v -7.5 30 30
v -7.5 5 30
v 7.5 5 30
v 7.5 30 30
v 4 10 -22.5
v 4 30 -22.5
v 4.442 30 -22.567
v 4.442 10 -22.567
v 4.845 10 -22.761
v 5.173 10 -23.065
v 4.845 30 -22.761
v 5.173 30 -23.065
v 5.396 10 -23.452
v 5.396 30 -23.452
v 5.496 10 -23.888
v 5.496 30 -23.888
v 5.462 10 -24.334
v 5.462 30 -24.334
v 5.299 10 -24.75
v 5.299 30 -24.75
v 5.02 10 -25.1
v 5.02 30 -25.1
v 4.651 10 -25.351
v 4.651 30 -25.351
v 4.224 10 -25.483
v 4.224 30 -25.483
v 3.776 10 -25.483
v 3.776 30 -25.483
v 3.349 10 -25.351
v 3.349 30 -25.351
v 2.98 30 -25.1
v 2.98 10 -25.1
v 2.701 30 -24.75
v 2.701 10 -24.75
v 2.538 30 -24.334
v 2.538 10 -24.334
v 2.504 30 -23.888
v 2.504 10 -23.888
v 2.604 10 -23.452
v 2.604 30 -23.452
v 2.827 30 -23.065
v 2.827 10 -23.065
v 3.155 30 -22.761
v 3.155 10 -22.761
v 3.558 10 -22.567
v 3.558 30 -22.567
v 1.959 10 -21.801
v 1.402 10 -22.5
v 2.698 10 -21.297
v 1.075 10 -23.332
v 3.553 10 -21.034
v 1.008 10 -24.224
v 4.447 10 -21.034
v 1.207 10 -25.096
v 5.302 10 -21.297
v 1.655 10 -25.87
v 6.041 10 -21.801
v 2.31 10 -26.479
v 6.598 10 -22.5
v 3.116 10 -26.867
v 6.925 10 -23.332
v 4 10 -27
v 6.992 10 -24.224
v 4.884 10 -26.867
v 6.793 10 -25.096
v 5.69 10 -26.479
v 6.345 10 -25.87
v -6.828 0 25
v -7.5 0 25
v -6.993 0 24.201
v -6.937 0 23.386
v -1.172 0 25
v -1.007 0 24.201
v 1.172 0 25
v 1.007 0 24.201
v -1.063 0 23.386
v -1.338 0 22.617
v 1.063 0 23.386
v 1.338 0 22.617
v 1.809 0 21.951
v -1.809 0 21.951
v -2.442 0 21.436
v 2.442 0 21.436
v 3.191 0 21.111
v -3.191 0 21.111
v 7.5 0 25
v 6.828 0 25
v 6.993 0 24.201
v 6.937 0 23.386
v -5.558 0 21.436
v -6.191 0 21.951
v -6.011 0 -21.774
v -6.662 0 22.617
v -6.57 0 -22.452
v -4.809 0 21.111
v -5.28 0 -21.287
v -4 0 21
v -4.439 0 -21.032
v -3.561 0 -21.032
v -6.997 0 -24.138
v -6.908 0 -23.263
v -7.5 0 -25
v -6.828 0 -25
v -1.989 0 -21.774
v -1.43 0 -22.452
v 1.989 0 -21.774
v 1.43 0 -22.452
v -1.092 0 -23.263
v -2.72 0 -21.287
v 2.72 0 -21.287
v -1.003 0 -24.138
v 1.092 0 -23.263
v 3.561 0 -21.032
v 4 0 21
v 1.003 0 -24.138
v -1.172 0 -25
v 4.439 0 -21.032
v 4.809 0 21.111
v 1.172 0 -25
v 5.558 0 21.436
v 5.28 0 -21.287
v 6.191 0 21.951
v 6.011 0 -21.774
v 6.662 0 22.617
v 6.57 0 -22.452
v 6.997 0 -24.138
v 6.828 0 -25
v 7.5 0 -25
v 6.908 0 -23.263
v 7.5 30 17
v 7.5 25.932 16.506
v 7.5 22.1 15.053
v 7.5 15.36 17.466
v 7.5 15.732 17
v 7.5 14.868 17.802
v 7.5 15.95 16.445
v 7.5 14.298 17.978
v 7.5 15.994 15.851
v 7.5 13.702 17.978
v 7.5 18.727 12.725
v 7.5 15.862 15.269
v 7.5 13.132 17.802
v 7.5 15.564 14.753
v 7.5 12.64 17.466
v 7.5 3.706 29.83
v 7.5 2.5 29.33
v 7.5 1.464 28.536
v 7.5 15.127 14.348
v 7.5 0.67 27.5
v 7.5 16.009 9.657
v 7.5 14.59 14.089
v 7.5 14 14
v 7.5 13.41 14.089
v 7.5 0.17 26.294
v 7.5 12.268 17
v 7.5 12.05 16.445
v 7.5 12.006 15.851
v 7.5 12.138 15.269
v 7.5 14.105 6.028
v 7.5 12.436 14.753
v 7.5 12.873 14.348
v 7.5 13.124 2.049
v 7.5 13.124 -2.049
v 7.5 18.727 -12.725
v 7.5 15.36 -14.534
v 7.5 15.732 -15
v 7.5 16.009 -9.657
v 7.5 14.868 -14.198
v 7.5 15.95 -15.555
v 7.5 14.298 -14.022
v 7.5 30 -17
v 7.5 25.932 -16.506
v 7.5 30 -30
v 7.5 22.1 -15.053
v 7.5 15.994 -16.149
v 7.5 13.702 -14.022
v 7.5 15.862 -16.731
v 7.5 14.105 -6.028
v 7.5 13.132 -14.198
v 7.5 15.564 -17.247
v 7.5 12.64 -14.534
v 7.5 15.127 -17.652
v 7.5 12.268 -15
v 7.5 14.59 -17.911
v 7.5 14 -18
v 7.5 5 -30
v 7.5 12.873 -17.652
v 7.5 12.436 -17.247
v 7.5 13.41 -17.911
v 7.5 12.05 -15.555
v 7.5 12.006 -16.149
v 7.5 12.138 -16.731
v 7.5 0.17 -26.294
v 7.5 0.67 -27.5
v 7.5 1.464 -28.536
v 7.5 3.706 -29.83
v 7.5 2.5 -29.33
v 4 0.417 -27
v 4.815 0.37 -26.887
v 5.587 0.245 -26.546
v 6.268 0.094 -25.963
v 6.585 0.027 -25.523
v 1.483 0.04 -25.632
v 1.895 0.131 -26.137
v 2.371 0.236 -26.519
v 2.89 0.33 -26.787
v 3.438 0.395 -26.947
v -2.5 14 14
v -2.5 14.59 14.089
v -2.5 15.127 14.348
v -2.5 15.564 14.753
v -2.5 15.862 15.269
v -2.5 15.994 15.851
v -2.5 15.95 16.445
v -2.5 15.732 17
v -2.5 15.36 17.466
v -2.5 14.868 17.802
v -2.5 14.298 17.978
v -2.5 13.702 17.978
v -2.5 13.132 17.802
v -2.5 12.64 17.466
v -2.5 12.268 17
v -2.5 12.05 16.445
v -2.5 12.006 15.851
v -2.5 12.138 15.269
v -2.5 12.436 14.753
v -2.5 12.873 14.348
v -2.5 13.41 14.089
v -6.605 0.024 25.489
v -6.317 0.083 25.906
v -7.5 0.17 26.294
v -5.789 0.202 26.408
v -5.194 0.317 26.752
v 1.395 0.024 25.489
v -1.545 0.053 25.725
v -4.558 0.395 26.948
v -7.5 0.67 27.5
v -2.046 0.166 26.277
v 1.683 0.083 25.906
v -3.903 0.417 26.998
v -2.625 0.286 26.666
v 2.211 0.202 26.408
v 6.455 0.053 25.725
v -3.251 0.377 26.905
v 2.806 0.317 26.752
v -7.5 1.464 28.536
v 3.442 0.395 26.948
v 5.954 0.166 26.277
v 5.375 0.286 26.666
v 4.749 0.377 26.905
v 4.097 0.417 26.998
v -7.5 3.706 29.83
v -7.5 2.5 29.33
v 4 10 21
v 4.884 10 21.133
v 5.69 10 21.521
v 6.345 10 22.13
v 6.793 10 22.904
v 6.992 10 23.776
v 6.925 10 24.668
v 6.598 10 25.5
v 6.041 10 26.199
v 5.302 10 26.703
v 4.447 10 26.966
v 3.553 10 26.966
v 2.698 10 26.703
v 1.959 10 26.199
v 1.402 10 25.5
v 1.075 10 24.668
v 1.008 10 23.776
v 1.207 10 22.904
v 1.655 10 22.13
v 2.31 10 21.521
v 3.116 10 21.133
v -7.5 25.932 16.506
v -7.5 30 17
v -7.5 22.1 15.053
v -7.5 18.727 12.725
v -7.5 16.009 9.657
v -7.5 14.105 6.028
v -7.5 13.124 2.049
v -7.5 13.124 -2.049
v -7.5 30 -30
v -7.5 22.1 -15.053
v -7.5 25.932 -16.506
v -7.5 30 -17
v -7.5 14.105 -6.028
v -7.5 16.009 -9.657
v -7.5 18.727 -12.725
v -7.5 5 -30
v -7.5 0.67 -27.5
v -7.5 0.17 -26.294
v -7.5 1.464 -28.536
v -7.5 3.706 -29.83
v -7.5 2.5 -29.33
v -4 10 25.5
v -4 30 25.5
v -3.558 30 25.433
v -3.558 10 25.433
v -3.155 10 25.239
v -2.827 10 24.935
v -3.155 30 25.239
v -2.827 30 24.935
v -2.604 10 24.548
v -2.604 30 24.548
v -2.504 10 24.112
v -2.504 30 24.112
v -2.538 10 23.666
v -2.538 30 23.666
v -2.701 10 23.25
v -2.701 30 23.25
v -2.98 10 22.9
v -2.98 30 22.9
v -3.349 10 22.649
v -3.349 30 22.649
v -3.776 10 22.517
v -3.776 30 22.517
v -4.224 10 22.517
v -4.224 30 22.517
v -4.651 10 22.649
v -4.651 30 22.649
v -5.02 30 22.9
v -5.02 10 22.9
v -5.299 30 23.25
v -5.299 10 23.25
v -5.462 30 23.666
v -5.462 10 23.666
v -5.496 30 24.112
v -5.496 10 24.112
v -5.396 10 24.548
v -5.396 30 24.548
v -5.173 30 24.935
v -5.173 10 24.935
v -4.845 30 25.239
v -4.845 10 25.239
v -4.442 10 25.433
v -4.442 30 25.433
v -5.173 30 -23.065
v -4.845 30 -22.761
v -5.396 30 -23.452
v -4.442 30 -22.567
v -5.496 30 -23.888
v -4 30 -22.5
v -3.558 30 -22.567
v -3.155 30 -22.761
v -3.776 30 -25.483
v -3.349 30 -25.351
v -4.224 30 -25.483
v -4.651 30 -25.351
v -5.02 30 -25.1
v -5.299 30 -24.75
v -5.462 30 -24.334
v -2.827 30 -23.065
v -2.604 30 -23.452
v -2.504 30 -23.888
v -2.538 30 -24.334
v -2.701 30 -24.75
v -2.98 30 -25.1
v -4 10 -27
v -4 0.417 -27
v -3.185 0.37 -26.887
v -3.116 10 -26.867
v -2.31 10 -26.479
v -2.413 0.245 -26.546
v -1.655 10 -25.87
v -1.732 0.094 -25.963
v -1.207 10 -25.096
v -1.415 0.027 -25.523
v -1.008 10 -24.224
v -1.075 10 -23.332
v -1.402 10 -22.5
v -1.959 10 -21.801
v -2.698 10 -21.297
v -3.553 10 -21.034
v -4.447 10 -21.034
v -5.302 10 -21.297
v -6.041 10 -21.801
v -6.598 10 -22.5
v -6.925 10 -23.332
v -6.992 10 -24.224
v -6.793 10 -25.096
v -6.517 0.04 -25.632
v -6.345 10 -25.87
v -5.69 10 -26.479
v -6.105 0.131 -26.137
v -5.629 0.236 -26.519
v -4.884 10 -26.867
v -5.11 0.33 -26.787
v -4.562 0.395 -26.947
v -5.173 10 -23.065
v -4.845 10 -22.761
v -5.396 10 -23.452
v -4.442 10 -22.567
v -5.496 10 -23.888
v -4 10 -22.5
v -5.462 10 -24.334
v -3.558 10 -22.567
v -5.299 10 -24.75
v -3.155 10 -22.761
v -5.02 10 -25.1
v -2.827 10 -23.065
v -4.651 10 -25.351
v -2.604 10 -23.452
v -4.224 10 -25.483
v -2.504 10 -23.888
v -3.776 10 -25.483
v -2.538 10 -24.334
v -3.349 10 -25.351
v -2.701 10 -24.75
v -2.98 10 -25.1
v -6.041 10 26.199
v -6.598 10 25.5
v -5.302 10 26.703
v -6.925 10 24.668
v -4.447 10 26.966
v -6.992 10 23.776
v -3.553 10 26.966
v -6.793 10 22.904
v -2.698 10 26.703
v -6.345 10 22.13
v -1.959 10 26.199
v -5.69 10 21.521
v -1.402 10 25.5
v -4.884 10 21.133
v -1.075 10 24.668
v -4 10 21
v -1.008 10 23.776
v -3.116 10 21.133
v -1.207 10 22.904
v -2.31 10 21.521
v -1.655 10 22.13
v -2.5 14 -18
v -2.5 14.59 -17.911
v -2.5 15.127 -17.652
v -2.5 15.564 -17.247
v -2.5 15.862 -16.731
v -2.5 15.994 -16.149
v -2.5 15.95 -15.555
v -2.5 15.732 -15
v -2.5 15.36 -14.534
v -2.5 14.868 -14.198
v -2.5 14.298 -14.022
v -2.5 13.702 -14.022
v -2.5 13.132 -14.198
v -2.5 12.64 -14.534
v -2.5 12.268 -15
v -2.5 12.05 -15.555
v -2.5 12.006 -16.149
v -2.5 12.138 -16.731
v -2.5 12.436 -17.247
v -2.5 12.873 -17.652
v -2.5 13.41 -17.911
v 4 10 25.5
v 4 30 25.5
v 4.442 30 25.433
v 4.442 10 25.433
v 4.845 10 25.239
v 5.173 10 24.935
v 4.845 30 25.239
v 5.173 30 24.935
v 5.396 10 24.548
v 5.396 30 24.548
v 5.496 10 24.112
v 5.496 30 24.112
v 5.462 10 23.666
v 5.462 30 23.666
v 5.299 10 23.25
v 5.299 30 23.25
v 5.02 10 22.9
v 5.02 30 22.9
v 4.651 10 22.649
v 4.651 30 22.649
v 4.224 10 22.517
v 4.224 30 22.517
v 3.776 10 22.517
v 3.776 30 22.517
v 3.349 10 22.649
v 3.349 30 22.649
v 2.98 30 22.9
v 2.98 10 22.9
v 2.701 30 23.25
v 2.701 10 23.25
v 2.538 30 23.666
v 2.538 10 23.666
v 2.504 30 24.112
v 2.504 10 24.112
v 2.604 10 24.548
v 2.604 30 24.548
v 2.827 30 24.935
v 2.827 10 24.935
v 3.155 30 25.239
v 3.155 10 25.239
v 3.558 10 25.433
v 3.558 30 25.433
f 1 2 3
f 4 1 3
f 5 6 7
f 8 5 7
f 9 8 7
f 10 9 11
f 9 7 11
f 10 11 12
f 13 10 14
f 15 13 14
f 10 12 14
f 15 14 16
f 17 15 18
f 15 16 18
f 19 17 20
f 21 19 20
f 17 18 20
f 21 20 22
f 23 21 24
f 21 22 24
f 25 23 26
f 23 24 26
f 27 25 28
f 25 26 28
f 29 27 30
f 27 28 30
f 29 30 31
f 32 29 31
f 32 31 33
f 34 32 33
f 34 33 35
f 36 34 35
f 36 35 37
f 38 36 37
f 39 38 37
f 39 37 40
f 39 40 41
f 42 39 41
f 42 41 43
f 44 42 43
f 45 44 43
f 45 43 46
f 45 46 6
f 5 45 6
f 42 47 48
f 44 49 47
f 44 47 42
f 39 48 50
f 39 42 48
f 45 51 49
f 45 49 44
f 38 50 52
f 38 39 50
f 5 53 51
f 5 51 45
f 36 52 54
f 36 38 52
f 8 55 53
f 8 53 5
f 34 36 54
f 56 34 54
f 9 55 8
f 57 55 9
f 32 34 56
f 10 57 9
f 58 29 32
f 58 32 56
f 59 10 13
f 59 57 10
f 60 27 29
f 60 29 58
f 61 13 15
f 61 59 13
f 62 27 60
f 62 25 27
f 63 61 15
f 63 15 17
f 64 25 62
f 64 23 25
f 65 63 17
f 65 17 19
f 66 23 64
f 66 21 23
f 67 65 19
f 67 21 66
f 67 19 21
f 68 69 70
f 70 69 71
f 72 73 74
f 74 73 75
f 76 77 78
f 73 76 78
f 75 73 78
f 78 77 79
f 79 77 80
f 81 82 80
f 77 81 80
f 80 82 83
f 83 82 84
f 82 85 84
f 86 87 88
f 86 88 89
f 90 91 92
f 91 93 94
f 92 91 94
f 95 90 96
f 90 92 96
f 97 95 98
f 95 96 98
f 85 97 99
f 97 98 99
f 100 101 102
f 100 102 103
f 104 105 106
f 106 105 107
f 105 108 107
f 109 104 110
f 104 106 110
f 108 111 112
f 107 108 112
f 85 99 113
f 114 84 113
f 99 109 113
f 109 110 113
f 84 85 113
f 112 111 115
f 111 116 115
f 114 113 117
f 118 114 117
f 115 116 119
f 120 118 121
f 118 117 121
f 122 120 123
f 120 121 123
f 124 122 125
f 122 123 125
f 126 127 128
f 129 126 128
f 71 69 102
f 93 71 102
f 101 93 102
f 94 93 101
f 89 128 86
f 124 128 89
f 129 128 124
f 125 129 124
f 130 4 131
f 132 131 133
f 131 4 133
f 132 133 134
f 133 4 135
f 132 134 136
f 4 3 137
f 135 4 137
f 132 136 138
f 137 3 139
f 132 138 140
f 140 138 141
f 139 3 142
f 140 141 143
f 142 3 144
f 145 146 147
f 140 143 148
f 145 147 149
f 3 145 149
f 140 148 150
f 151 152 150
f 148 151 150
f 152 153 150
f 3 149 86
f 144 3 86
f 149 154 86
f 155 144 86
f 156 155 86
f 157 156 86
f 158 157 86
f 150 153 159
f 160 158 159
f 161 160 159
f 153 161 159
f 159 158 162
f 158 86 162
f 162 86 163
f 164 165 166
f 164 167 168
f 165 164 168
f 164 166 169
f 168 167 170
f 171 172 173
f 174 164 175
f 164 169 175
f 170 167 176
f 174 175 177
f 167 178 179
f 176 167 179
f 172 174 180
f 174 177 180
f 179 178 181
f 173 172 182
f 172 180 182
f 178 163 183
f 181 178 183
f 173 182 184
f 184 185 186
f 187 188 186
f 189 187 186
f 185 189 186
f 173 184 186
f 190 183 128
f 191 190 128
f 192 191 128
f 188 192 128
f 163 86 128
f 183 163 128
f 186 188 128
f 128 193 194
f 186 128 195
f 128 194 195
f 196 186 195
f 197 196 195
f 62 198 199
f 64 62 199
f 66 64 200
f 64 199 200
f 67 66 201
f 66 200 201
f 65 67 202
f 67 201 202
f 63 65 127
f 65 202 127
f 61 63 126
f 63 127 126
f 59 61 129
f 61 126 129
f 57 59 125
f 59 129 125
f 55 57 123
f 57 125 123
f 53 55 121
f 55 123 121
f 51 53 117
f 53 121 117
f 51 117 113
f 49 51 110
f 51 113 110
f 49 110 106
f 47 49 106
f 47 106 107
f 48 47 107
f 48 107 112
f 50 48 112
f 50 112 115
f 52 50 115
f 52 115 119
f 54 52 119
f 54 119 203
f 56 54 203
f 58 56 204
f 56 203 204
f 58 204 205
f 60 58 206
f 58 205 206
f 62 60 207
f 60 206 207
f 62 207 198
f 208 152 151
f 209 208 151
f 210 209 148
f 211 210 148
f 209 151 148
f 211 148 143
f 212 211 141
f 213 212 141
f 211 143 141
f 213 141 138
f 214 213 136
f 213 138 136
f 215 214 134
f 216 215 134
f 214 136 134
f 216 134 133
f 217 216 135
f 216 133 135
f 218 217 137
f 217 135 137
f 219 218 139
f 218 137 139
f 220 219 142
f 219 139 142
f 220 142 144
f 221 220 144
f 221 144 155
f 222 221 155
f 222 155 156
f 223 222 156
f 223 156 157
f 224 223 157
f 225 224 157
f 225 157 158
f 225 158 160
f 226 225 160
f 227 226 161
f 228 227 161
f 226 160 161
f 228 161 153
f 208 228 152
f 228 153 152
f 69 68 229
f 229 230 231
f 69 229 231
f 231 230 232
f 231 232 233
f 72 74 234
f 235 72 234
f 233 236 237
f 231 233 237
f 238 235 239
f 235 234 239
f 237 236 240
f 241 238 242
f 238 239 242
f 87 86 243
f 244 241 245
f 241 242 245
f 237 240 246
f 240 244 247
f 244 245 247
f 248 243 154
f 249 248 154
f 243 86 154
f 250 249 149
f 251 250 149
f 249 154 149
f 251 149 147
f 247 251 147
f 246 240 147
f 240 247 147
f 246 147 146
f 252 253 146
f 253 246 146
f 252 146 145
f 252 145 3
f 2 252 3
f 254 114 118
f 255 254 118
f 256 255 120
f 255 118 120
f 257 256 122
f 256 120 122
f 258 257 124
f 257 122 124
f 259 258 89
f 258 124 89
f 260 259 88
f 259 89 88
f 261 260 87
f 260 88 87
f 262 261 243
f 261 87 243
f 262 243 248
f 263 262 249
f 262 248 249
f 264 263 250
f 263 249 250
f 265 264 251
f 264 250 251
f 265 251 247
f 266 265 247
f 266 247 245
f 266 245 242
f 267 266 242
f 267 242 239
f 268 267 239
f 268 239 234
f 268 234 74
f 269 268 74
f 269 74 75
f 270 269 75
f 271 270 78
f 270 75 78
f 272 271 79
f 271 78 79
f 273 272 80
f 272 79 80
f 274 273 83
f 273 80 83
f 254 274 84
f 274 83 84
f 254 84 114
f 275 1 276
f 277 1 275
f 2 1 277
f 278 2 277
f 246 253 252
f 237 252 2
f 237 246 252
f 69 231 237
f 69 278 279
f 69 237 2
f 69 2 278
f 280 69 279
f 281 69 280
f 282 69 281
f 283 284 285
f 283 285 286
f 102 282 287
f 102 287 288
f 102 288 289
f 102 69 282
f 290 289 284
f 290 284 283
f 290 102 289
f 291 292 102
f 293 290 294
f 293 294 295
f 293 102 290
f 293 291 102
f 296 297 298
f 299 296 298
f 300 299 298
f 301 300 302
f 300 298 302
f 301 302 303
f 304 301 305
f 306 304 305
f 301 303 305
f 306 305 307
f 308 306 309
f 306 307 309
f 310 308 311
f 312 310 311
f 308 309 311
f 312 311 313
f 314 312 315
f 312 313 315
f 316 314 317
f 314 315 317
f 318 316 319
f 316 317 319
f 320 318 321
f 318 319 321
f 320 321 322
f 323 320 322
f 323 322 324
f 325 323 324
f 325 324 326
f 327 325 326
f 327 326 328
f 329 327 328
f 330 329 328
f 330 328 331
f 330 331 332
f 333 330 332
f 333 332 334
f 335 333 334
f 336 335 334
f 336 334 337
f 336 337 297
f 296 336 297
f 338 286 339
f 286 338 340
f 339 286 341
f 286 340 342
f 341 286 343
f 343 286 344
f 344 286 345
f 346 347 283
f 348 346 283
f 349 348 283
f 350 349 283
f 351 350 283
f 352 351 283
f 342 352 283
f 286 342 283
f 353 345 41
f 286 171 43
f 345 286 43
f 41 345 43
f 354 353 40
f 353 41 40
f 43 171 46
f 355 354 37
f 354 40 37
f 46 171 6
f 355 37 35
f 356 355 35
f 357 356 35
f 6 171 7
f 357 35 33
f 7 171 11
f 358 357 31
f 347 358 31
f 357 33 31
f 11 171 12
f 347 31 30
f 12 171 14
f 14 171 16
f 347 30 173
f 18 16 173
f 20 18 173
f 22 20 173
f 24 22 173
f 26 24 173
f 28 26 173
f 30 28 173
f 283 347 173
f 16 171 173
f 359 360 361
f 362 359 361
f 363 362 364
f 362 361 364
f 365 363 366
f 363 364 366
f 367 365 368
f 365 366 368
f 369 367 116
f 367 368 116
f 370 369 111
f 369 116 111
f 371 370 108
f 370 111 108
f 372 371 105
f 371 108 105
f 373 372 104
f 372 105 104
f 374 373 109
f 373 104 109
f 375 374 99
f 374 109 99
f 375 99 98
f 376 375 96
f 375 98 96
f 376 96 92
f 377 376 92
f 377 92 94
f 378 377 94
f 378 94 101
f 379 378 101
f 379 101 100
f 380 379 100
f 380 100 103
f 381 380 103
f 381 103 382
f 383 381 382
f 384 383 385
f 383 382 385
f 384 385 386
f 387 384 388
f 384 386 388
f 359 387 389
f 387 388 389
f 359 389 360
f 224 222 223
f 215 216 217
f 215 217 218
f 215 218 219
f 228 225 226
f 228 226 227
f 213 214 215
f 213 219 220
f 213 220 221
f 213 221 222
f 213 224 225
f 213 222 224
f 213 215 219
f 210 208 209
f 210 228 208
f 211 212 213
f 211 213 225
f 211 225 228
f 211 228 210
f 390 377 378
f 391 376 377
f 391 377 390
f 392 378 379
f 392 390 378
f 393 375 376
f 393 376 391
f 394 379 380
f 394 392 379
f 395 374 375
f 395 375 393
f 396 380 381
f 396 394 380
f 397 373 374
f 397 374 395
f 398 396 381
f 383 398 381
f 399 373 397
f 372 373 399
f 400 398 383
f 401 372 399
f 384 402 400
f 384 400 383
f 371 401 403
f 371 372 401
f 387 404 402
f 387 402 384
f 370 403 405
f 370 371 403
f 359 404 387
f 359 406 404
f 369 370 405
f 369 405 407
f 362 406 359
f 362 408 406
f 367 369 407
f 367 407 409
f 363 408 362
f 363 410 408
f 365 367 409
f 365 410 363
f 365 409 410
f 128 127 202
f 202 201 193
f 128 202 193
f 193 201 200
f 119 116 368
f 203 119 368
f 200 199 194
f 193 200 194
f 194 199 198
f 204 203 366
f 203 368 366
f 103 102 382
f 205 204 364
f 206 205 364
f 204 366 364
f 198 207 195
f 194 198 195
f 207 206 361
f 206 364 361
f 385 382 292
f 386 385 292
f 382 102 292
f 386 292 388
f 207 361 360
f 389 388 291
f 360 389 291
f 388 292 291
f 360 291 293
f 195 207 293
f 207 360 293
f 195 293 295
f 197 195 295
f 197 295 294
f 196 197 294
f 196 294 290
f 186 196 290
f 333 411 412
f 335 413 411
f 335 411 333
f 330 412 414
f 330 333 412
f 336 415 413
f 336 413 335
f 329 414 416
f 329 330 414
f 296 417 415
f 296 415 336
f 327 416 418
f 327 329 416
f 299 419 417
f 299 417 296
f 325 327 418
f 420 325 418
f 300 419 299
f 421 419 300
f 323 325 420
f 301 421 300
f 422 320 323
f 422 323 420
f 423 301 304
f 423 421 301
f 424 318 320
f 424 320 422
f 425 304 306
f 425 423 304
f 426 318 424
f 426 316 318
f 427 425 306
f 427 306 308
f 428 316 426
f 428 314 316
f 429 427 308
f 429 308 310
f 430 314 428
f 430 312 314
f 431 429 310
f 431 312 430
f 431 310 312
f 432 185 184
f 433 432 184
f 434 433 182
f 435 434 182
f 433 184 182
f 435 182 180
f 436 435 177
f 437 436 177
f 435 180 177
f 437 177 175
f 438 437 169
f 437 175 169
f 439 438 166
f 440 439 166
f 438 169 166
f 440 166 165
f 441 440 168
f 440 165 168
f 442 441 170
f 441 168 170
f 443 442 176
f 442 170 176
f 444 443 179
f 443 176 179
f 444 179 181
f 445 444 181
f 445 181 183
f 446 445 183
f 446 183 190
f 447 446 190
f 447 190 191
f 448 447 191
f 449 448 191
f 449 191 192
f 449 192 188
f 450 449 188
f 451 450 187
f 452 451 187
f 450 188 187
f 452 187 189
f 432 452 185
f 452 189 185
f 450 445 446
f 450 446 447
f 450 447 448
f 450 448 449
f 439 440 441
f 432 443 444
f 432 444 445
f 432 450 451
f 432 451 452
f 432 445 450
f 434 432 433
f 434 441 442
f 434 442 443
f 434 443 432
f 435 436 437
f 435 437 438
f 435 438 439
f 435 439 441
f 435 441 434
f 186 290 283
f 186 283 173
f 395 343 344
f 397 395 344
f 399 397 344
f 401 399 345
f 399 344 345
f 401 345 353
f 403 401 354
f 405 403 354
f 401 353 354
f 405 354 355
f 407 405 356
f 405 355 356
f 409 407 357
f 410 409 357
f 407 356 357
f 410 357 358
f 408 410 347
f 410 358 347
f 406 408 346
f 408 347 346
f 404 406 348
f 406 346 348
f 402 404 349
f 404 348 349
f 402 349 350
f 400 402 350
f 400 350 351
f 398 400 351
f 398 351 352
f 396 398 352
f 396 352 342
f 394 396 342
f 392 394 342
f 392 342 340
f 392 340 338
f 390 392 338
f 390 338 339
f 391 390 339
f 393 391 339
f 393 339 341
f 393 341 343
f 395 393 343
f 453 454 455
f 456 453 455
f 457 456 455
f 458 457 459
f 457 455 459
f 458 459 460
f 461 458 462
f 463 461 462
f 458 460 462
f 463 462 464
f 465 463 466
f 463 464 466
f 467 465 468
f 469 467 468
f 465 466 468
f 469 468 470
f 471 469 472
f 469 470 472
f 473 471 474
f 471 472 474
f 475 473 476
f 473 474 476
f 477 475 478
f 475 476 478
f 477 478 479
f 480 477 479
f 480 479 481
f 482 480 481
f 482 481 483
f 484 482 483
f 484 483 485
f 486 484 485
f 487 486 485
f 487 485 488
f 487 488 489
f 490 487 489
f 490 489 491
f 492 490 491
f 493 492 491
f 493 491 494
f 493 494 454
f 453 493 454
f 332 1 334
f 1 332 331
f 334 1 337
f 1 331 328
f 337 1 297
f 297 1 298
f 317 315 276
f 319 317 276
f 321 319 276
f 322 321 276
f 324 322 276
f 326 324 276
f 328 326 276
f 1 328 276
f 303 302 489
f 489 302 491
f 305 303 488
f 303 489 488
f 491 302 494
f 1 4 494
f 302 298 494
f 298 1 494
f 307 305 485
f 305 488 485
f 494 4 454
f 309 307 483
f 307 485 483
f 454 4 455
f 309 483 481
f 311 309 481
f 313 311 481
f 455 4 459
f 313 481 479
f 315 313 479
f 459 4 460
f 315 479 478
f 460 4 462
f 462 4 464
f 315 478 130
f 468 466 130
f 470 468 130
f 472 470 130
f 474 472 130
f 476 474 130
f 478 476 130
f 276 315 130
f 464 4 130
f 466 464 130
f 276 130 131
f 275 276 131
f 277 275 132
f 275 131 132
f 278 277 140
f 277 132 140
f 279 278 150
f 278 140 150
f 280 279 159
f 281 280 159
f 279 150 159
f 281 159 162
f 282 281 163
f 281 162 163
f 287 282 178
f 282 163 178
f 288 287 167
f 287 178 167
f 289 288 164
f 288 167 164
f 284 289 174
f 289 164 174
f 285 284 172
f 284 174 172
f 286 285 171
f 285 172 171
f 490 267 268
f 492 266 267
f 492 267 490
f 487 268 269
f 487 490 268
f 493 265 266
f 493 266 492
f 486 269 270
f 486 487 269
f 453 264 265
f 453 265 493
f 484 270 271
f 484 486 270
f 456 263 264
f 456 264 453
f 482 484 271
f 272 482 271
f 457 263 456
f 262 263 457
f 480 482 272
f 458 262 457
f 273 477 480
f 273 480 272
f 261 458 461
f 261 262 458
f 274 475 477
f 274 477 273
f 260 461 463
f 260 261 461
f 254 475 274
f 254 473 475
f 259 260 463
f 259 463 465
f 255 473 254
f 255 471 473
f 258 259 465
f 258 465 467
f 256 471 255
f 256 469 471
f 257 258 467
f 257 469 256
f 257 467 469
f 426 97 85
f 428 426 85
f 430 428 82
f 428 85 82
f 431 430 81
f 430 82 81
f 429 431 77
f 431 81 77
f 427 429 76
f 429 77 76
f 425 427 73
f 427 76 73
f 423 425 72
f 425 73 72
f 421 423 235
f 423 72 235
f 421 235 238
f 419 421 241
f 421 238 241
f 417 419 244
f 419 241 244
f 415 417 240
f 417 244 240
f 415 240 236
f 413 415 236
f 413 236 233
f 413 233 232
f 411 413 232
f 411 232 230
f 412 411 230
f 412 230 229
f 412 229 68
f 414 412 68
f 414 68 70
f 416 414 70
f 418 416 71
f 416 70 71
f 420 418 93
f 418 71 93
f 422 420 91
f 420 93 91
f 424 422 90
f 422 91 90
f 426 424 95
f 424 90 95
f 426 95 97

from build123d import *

# Parameters (mm, degrees)
SKETCH1_W           = 15
SKETCH1_H           = 60
BOSS_EXTRUDE1_DEPTH = 70
SKETCH2_R           = 17
CUT_EXTRUDE1_DEPTH  = 70
SKETCH3_W           = 60
SKETCH3_H           = 40
CUT_EXTRUDE2_DEPTH  = 29
SKETCH4_R           = 1.5
CUT_EXTRUDE3_DEPTH  = 43
SKETCH5_R           = 2
CUT_EXTRUDE4_DEPTH  = 10
SKETCH7_R           = 3
CUT_EXTRUDE5_DEPTH  = 10
FILLET1_R           = 5


with BuildPart() as part:
    # Sketch1 → Boss-Extrude1 (new body)
    with BuildSketch(Plane(origin=(0, 0, 0), x_dir=(1, 0, 0), z_dir=(0, 1, 0))):
        Rectangle(SKETCH1_W, SKETCH1_H)
    extrude(amount=BOSS_EXTRUDE1_DEPTH)

    # Sketch2 → Cut-Extrude1 (cut)
    with BuildSketch(Plane(origin=(7.5, 0, 0), x_dir=(0, 0, -1), z_dir=(1, 0, 0))):
        with Locations((0, 30)):
            Circle(SKETCH2_R)
    extrude(amount=-CUT_EXTRUDE1_DEPTH, mode=Mode.SUBTRACT)

    # Sketch3 → Cut-Extrude2 (cut)
    with BuildSketch(Plane(origin=(7.5, 0, 0), x_dir=(0, 0, -1), z_dir=(1, 0, 0))):
        with Locations((0, 50)):
            Rectangle(SKETCH3_W, SKETCH3_H)
    extrude(amount=-CUT_EXTRUDE2_DEPTH, mode=Mode.SUBTRACT)

    # Sketch4 → Cut-Extrude3 (cut)
    with BuildSketch(Plane(origin=(0, 30, 0), x_dir=(1, 0, 0), z_dir=(0, 1, 0))):
        with Locations(Location((-4, 24, 0), (0, 0, 270))):
            Circle(SKETCH4_R)
        with Locations(Location((4, 24, 0), (0, 0, 270))):
            Circle(SKETCH4_R)
        with Locations(Location((-4, -24, 0), (0, 0, 270))):
            Circle(SKETCH4_R)
        with Locations(Location((4, -24, 0), (0, 0, 270))):
            Circle(SKETCH4_R)
    extrude(amount=-CUT_EXTRUDE3_DEPTH, mode=Mode.SUBTRACT)

    # Sketch5 → Cut-Extrude4 (cut)
    with BuildSketch(Plane(origin=(7.5, 0, 0), x_dir=(0, 0, -1), z_dir=(1, 0, 0))):
        with Locations((-16, 14)):
            Circle(SKETCH5_R)
        with Locations((16, 14)):
            Circle(SKETCH5_R)
    extrude(amount=-CUT_EXTRUDE4_DEPTH, mode=Mode.SUBTRACT)

    # Sketch7 → Cut-Extrude5 (cut)
    with BuildSketch(Plane.XZ):
        with Locations(Location((-4, 24, 0), (0, 0, 270))):
            Circle(SKETCH7_R)
        with Locations(Location((4, 24, 0), (0, 0, 270))):
            Circle(SKETCH7_R)
        with Locations(Location((-4, -24, 0), (0, 0, 270))):
            Circle(SKETCH7_R)
        with Locations(Location((4, -24, 0), (0, 0, 270))):
            Circle(SKETCH7_R)
    extrude(amount=-CUT_EXTRUDE5_DEPTH, mode=Mode.SUBTRACT)

    # Fillet1
    # the kernel refuses this fillet: 5 mm, written as the material it takes off along each edge
    with BuildSketch(Plane(origin=(-20, 0, -30), x_dir=(0, 0, 1), z_dir=(1, 0, 0))) as fillet1_piece_1:
        with BuildLine():
            CenterArc((FILLET1_R, -FILLET1_R), FILLET1_R, 90, 90)
            Line((0, -FILLET1_R), (0, 0))
            Line((0, 0), (FILLET1_R, 0))
        make_face()
    extrude(amount=40, mode=Mode.SUBTRACT)
    with BuildSketch(Plane(origin=(20, 0, 30), x_dir=(0, 1, 0), z_dir=(-1, 0, 0))) as fillet1_piece_2:
        with BuildLine():
            CenterArc((FILLET1_R, FILLET1_R), FILLET1_R, 180, 90)
            Line((0, FILLET1_R), (0, 0))
            Line((0, 0), (FILLET1_R, 0))
        make_face()
    extrude(amount=40, mode=Mode.SUBTRACT)


solid = part.part
